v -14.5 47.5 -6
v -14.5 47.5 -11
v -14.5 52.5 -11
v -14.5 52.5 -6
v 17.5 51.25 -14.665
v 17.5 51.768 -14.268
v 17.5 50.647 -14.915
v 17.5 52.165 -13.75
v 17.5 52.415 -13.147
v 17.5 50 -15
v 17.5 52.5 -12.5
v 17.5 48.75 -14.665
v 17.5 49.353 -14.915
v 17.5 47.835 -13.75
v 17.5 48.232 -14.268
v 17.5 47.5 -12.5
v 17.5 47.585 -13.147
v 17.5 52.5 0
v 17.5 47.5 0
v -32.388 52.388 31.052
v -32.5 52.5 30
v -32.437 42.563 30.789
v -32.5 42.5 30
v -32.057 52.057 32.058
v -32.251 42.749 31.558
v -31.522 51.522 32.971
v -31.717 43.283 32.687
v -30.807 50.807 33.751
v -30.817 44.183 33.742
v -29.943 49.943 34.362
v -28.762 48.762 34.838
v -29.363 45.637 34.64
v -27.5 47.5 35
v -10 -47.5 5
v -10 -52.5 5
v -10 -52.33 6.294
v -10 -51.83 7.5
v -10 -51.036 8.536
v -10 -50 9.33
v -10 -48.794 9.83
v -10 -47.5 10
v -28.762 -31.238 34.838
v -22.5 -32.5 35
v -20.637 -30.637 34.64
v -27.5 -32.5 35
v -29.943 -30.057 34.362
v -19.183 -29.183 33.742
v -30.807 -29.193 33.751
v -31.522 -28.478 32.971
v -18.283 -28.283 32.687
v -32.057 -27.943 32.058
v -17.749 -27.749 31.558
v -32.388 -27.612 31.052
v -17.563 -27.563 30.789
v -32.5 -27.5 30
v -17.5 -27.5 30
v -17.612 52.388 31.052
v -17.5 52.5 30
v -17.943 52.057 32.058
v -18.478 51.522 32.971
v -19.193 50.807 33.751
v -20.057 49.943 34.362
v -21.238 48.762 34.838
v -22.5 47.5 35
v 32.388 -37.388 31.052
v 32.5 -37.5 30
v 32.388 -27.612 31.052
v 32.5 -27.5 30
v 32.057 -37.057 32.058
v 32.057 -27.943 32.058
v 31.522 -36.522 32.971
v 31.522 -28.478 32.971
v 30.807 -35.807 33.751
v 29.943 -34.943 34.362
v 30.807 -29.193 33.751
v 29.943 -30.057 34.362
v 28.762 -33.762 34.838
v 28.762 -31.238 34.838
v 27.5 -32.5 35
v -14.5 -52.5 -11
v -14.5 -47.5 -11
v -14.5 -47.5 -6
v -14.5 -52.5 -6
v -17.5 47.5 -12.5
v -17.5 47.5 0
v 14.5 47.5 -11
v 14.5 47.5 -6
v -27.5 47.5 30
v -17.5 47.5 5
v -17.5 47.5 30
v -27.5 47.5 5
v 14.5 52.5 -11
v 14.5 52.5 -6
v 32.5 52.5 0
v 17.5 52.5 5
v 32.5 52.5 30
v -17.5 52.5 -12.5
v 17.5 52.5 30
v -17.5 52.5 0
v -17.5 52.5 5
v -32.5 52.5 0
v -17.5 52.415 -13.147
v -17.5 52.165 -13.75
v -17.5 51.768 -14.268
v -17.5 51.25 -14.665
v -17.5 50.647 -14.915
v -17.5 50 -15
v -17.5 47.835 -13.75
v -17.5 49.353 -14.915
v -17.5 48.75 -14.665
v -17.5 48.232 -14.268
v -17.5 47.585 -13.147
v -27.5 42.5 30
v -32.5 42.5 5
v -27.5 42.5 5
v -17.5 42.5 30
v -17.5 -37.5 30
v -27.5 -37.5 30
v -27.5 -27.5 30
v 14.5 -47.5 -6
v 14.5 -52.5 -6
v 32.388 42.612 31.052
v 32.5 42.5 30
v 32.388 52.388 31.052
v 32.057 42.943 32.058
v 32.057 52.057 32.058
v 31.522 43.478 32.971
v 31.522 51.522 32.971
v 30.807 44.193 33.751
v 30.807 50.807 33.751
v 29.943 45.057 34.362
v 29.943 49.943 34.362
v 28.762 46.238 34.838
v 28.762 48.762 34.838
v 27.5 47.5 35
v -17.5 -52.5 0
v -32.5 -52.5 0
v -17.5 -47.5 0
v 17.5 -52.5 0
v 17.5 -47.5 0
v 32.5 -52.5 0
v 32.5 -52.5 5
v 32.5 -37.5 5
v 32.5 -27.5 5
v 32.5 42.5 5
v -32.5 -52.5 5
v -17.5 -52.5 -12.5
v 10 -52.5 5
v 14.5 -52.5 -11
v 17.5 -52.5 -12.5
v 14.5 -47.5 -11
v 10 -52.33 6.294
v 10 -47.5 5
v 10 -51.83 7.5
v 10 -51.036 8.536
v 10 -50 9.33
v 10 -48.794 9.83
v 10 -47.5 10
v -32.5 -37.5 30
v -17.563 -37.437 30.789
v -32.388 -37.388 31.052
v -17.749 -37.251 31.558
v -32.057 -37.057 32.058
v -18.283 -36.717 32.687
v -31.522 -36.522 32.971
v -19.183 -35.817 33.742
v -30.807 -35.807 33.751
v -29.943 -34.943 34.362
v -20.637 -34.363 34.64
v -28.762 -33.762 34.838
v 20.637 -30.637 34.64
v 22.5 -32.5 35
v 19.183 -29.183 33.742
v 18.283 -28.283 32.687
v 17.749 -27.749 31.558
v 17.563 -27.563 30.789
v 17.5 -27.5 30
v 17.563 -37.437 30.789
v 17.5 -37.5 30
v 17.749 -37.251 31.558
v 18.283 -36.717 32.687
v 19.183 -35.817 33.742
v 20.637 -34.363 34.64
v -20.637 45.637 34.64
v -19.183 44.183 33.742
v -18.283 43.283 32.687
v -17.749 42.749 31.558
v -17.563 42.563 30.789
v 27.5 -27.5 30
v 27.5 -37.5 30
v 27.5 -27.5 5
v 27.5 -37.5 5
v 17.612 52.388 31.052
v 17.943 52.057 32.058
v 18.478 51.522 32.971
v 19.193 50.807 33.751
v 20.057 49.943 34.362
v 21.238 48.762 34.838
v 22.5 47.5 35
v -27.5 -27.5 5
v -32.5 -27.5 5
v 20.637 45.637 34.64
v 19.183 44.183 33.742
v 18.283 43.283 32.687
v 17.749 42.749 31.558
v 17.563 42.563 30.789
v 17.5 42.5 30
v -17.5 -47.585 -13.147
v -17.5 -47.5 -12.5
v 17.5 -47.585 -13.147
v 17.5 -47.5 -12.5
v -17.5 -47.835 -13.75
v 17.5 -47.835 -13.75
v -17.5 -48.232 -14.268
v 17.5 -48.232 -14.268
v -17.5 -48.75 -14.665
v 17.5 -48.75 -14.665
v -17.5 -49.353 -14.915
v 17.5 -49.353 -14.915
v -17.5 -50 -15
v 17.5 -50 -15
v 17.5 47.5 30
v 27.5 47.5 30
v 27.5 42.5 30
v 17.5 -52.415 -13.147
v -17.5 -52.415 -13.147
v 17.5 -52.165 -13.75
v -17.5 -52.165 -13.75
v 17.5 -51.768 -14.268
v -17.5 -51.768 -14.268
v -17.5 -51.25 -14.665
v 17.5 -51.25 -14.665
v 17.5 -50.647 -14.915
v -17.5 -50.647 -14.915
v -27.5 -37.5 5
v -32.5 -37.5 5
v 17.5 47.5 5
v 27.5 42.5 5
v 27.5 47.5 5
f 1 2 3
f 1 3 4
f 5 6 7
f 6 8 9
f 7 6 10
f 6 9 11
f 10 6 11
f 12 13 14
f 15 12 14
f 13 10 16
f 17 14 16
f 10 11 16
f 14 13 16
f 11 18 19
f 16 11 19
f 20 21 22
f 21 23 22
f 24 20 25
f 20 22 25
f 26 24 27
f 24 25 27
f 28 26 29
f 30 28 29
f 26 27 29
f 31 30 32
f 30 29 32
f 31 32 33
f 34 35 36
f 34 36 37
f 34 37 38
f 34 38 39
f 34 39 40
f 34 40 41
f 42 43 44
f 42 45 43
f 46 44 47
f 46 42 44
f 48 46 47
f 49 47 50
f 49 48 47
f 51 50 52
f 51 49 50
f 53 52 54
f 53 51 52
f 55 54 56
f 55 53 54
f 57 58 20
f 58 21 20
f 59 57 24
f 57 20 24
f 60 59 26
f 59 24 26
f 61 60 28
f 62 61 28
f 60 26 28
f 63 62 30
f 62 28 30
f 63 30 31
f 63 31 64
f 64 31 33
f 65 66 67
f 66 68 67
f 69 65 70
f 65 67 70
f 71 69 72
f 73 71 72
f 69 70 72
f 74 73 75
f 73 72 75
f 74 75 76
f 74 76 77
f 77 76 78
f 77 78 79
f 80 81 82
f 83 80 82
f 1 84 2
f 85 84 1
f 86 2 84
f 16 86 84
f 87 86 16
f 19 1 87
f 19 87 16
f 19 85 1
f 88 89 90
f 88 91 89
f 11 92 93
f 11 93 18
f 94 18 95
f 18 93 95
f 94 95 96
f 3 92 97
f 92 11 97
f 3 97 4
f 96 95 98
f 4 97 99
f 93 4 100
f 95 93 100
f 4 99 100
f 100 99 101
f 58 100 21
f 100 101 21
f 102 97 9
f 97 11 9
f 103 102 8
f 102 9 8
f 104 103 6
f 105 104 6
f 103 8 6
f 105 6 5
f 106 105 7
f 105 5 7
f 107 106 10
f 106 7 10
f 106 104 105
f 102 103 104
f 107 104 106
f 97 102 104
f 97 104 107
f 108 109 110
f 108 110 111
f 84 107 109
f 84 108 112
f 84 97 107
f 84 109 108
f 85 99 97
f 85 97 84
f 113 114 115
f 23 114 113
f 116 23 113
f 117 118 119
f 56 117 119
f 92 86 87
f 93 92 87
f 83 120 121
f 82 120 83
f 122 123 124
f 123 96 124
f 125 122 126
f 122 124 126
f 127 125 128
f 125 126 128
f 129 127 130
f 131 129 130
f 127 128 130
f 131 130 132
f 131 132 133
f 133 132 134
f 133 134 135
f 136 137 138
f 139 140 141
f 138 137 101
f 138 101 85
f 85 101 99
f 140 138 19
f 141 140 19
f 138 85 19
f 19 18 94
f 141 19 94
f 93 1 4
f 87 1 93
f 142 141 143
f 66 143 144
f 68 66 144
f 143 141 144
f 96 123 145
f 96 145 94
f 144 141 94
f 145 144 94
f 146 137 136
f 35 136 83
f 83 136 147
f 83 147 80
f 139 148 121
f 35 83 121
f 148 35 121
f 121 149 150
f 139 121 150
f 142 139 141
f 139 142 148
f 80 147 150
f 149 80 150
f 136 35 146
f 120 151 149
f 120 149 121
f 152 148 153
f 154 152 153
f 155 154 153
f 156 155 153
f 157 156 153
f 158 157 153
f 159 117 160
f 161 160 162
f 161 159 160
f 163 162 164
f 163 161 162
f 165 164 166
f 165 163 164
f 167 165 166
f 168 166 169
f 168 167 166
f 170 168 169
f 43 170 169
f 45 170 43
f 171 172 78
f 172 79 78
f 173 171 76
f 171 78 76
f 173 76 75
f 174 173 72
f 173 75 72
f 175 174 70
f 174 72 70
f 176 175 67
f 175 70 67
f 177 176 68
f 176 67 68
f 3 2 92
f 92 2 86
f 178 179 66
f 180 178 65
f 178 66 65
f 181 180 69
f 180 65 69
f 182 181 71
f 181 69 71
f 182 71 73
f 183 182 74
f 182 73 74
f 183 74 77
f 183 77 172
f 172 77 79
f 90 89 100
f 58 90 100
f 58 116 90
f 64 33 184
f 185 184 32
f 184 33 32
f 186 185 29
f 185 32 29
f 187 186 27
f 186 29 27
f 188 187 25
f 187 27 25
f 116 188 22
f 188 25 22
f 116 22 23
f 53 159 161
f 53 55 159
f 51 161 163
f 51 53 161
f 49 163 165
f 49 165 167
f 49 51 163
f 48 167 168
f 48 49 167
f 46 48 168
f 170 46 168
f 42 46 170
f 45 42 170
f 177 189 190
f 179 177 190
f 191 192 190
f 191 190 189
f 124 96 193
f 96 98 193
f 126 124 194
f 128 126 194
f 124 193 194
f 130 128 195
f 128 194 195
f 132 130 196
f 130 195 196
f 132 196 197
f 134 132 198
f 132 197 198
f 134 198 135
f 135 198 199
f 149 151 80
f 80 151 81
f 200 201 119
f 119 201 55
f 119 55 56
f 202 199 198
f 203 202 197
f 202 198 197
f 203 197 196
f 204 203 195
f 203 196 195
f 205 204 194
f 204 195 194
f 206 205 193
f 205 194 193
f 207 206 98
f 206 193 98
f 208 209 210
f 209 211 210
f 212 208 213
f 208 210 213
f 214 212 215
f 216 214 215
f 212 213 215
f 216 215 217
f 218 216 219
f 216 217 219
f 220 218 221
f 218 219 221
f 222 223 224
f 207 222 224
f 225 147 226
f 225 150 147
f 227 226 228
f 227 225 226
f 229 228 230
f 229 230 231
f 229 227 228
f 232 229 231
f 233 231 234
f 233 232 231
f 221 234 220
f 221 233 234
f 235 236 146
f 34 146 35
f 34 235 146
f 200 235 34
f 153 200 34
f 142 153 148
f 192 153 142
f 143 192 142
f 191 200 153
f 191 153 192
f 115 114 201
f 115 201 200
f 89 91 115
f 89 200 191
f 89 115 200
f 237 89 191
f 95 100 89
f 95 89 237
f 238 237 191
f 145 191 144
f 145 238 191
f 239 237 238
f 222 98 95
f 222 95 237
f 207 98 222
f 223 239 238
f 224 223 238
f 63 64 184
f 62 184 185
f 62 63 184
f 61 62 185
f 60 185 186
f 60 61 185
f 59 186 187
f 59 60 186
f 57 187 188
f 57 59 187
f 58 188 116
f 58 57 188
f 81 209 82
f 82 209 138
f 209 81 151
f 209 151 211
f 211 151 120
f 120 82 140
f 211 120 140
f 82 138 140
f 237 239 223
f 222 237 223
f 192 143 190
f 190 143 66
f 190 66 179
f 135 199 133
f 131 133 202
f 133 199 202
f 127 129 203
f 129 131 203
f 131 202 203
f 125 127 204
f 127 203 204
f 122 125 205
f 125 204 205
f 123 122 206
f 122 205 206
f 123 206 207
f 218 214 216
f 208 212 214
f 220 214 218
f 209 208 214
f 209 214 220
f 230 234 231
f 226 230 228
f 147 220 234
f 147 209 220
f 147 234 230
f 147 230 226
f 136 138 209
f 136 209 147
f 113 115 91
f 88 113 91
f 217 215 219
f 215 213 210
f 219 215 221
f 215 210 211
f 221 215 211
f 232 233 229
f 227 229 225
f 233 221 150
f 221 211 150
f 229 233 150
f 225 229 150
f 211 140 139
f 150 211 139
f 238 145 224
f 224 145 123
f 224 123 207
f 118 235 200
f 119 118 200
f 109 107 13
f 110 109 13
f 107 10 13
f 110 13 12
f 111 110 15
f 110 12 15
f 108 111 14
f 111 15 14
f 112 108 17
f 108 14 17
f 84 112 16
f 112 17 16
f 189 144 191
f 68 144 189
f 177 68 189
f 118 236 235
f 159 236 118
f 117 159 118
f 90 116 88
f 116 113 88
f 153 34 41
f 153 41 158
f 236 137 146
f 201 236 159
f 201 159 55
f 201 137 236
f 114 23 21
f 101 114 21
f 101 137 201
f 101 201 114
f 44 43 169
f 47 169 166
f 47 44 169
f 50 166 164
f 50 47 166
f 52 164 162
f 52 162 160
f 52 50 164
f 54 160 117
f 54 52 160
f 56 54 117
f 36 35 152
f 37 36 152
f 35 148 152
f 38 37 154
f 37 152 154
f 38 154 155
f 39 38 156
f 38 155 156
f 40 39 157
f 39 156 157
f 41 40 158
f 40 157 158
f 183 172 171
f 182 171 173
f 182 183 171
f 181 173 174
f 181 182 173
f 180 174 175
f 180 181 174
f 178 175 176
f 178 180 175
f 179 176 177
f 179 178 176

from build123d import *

# Parameters (mm, degrees)
F0_W      = 65
F0_H      = 105
F2_DEPTH  = 5
F3_DEPTH  = 35
F4_W      = 5
F4_H      = 5
F5_DEPTH  = 5
F6_W      = 5
F6_H      = 5
F7_DEPTH  = 5
F8_W      = 5
F8_H      = 10
F9_DEPTH  = 30
F11_W     = 10
F11_H     = 5
F12_DEPTH = 10
F10_W     = 10
F10_H     = 5
F13_DEPTH = 10
F14_DEPTH = 5
F15_DEPTH = 5
F16_W     = 20
F16_H     = 5
F17_DEPTH = 5
F18_W     = 35
F18_H     = 5
F19_DEPTH = 15
F21_W     = 29
F21_H     = 5
F22_DEPTH = 25
F20_W     = 29
F20_H     = 5
F23_DEPTH = 25
F24_R     = 2.49999
F25_R     = 4.99999


# Not quite as in the source:
# - a fillet or chamfer is up to 0.001 mm smaller than in the source, because OpenCascade refuses the exact size


with BuildPart() as f2:
    # F0 (on Top) → F2 (new body)
    with BuildSketch(Plane.XY):
        Rectangle(F0_W, F0_H)
    extrude(amount=F2_DEPTH)

    # F1 (on face) → F3 (join)
    with BuildSketch(Plane.XY):
        Polygon((-22.5, 52.5), (-27.5, 52.5), (-32.5, 52.5), (-32.5, 47.5), (-32.5, 42.5), (-27.5, 42.5), (-27.5, 47.5), (-22.5, 47.5), align=None)
        Polygon((27.5, 52.5), (22.5, 52.5), (22.5, 47.5), (27.5, 47.5), (27.5, 42.5), (32.5, 42.5), (32.5, 52.5), align=None)
    extrude(amount=F3_DEPTH)

    # F4 (on face) → F5 (join)
    with BuildSketch(Plane(origin=(27.5, 0, 0), x_dir=(0, -1, 0), z_dir=(-1, 0, 0))):
        with Locations((-45, 32.5)):
            Rectangle(F4_W, F4_H)
    extrude(amount=F5_DEPTH)

    # F6 (on face) → F7 (join)
    with BuildSketch(Plane.YZ.offset(-27.5)):
        with Locations((45, 32.5)):
            Rectangle(F6_W, F6_H)
    extrude(amount=F7_DEPTH)

    # F8 (on face) → F9 (join)
    with BuildSketch(Plane.XY.offset(5)):
        with Locations((30, -32.5)):
            Rectangle(F8_W, F8_H)
        with Locations((-30, -32.5)):
            Rectangle(F8_W, F8_H)
    extrude(amount=F9_DEPTH)

    # F11 (on face) → F12 (join)
    with BuildSketch(Plane(origin=(27.5, 0, 0), x_dir=(0, -1, 0), z_dir=(-1, 0, 0))):
        with Locations((32.5, 32.5)):
            Rectangle(F11_W, F11_H)
    extrude(amount=F12_DEPTH)

    # F10 (on face) → F13 (join)
    with BuildSketch(Plane.YZ.offset(-27.5)):
        with Locations((-32.5, 32.5)):
            Rectangle(F10_W, F10_H)
    extrude(amount=F13_DEPTH)

    # F14 (add): a face of the model
    f14_faces = [f2.faces().sort_by_distance(p)[0] for p in [
        (22.5, 49.2857142857, 21.7857142857),
    ]]
    extrude(f14_faces, amount=F14_DEPTH)

    # F15 (add): a face of the model
    f15_faces = [f2.faces().sort_by_distance(p)[0] for p in [
        (-22.5, 49.2857142857, 21.7857142857),
    ]]
    extrude(f15_faces, amount=F15_DEPTH)

    # F16 (on face) → F17 (join)
    with BuildSketch(Plane.XY.offset(5)):
        with Locations((0, -50)):
            Rectangle(F16_W, F16_H)
    extrude(amount=F17_DEPTH)

    # F18 (on face) → F19 (join)
    with BuildSketch(Plane(origin=(0, 0, 0), x_dir=(1, 0, 0), z_dir=(0, 0, -1))):
        with Locations((0, 50)):
            Rectangle(F18_W, F18_H)
        with Locations((0, -50)):
            Rectangle(F18_W, F18_H)
    extrude(amount=F19_DEPTH)

    # F21 (on face) → F22 (cut)
    with BuildSketch(Plane.XZ.offset(-47.5)):
        with Locations((0, -8.5)):
            Rectangle(F21_W, F21_H)
    extrude(amount=-F22_DEPTH, mode=Mode.SUBTRACT)

    # F20 (on face) → F23 (cut)
    with BuildSketch(Plane(origin=(0, -47.5, 0), x_dir=(-1, 0, 0), z_dir=(0, 1, 0))):
        with Locations((0, -8.5)):
            Rectangle(F20_W, F20_H)
    extrude(amount=-F23_DEPTH, mode=Mode.SUBTRACT)

    # F24 (radius 2.5 in the source; OpenCascade refuses exactly that, so slightly less here)
    f24_edges = [f2.edges().sort_by_distance(p)[0] for p in [
        (0, 52.5, -15),
        (0, 47.5, -15),
        (0, -52.5, -15),
        (0, -47.5, -15),
    ]]
    fillet(f24_edges, radius=F24_R)

    # F25 (radius 5 in the source; OpenCascade refuses exactly that, so slightly less here)
    f25_edges = [f2.edges().sort_by_distance(p)[0] for p in [
        (-32.5, -32.5, 35),
        (32.5, -32.5, 35),
        (17.5, -32.5, 35),
        (-17.5, -32.5, 35),
        (-25, 52.5, 35),
        (25, 52.5, 35),
        (32.5, 47.5, 35),
        (25, 42.5, 35),
        (17.5, 47.5, 35),
        (-25, 42.5, 35),
        (-17.5, 47.5, 35),
        (-32.5, 47.5, 35),
        (-25, -37.5, 35),
        (-25, -27.5, 35),
        (25, -37.5, 35),
        (25, -27.5, 35),
        (0, -52.5, 10),
    ]]
    fillet(f25_edges, radius=F25_R)


solid = f2.part
